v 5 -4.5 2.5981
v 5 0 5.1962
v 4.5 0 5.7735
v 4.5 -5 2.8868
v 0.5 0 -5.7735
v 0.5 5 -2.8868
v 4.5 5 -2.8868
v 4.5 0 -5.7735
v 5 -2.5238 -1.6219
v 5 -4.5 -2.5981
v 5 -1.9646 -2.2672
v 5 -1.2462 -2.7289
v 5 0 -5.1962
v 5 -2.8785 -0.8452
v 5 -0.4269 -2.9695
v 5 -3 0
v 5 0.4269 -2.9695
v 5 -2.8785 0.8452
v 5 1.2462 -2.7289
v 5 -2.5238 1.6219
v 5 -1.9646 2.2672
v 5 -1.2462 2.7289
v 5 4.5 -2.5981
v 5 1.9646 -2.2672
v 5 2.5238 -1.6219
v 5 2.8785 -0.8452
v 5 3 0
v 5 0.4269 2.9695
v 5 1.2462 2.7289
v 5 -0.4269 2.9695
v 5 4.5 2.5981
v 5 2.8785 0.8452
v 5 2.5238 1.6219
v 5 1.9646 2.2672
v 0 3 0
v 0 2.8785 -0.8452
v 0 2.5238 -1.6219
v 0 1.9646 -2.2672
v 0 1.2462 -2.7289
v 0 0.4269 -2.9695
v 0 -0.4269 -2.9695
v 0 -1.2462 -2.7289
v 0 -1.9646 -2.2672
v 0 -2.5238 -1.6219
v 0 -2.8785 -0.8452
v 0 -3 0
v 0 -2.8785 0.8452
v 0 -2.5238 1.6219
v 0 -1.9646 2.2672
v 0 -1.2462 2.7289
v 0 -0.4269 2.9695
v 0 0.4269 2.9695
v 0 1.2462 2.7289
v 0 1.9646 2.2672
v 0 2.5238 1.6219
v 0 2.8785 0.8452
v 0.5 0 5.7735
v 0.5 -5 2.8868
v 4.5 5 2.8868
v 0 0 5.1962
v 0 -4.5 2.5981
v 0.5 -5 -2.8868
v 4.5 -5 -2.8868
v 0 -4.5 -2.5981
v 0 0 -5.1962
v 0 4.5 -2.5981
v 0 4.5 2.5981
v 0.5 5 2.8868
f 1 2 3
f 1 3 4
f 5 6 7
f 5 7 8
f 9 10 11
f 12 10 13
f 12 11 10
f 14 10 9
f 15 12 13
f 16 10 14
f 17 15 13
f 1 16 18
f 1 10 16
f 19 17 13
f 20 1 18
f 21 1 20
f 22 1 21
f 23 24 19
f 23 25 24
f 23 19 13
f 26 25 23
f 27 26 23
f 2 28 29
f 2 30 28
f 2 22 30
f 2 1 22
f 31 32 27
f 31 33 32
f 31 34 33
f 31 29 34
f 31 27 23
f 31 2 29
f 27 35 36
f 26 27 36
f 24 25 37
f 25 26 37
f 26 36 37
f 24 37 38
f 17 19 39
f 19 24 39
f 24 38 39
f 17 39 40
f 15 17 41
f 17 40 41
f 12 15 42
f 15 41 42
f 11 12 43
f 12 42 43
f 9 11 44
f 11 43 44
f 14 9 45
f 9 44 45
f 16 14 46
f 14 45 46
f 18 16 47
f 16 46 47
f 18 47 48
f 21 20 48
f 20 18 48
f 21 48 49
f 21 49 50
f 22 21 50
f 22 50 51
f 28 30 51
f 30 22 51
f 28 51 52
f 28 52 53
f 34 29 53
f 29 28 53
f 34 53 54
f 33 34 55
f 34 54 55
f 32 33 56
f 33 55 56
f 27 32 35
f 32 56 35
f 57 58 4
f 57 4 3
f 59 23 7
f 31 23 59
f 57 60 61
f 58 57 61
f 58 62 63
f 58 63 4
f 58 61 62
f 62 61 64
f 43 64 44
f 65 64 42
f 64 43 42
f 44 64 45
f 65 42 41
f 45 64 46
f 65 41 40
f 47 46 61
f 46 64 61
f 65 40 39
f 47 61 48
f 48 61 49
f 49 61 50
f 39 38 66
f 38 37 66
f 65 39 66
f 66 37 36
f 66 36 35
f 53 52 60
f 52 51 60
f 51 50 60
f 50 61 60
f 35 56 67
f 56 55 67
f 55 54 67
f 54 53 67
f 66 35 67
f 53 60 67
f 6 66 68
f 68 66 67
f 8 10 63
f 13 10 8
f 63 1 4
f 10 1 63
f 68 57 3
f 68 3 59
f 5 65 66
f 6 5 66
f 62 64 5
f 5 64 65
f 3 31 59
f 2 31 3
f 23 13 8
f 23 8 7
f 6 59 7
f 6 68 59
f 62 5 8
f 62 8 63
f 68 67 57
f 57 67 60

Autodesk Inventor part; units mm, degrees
ref_plane "YZ Plane" through (0, 0, 0) normal (1, 0, 0) x (0, 1, 0)
ref_plane "XZ Plane" through (0, 0, 0) normal (0, 1, 0) x (-1, 0, 0)
ref_plane "XY Plane" through (0, 0, 0) normal (0, 0, 1) x (1, 0, 0)
sketch "Эскиз1" plane through (0, 0, 0) normal (1, 0, 0) x (0, 1, 0)
  line L0 (0, -5.7735) -> (-5, -2.8868)
  line L1 (-5, -2.8868) -> (-5, 2.8868)
  line L2 (-5, 2.8868) -> (0, 5.7735)
  line L3 (0, 5.7735) -> (5, 2.8868)
  line L4 (5, 2.8868) -> (5, -2.8868)
  line L5 (5, -2.8868) -> (0, -5.7735)
  circle A0 centre (0, 0) radius 3
  dimension "d0" = 10
  dimension "d1" = 6
extrude "Выдавливание1" add sketch "Эскиз1" along normal blind 5
chamfer "Фаска1" distance 0.5 angle 45 12 edges at (5, 2.5, 4.3301) (5, 5, 0) (5, 2.5, -4.3301) (5, -2.5, -4.3301) (5, -5, 0) (5, -2.5, 4.3301) (0, 2.5, 4.3301) (0, -2.5, 4.3301) (0, 5, 0) (0, 2.5, -4.3301) (0, -2.5, -4.3301) (0, -5, 0)
properties part number "04-01-Гайка М10"
